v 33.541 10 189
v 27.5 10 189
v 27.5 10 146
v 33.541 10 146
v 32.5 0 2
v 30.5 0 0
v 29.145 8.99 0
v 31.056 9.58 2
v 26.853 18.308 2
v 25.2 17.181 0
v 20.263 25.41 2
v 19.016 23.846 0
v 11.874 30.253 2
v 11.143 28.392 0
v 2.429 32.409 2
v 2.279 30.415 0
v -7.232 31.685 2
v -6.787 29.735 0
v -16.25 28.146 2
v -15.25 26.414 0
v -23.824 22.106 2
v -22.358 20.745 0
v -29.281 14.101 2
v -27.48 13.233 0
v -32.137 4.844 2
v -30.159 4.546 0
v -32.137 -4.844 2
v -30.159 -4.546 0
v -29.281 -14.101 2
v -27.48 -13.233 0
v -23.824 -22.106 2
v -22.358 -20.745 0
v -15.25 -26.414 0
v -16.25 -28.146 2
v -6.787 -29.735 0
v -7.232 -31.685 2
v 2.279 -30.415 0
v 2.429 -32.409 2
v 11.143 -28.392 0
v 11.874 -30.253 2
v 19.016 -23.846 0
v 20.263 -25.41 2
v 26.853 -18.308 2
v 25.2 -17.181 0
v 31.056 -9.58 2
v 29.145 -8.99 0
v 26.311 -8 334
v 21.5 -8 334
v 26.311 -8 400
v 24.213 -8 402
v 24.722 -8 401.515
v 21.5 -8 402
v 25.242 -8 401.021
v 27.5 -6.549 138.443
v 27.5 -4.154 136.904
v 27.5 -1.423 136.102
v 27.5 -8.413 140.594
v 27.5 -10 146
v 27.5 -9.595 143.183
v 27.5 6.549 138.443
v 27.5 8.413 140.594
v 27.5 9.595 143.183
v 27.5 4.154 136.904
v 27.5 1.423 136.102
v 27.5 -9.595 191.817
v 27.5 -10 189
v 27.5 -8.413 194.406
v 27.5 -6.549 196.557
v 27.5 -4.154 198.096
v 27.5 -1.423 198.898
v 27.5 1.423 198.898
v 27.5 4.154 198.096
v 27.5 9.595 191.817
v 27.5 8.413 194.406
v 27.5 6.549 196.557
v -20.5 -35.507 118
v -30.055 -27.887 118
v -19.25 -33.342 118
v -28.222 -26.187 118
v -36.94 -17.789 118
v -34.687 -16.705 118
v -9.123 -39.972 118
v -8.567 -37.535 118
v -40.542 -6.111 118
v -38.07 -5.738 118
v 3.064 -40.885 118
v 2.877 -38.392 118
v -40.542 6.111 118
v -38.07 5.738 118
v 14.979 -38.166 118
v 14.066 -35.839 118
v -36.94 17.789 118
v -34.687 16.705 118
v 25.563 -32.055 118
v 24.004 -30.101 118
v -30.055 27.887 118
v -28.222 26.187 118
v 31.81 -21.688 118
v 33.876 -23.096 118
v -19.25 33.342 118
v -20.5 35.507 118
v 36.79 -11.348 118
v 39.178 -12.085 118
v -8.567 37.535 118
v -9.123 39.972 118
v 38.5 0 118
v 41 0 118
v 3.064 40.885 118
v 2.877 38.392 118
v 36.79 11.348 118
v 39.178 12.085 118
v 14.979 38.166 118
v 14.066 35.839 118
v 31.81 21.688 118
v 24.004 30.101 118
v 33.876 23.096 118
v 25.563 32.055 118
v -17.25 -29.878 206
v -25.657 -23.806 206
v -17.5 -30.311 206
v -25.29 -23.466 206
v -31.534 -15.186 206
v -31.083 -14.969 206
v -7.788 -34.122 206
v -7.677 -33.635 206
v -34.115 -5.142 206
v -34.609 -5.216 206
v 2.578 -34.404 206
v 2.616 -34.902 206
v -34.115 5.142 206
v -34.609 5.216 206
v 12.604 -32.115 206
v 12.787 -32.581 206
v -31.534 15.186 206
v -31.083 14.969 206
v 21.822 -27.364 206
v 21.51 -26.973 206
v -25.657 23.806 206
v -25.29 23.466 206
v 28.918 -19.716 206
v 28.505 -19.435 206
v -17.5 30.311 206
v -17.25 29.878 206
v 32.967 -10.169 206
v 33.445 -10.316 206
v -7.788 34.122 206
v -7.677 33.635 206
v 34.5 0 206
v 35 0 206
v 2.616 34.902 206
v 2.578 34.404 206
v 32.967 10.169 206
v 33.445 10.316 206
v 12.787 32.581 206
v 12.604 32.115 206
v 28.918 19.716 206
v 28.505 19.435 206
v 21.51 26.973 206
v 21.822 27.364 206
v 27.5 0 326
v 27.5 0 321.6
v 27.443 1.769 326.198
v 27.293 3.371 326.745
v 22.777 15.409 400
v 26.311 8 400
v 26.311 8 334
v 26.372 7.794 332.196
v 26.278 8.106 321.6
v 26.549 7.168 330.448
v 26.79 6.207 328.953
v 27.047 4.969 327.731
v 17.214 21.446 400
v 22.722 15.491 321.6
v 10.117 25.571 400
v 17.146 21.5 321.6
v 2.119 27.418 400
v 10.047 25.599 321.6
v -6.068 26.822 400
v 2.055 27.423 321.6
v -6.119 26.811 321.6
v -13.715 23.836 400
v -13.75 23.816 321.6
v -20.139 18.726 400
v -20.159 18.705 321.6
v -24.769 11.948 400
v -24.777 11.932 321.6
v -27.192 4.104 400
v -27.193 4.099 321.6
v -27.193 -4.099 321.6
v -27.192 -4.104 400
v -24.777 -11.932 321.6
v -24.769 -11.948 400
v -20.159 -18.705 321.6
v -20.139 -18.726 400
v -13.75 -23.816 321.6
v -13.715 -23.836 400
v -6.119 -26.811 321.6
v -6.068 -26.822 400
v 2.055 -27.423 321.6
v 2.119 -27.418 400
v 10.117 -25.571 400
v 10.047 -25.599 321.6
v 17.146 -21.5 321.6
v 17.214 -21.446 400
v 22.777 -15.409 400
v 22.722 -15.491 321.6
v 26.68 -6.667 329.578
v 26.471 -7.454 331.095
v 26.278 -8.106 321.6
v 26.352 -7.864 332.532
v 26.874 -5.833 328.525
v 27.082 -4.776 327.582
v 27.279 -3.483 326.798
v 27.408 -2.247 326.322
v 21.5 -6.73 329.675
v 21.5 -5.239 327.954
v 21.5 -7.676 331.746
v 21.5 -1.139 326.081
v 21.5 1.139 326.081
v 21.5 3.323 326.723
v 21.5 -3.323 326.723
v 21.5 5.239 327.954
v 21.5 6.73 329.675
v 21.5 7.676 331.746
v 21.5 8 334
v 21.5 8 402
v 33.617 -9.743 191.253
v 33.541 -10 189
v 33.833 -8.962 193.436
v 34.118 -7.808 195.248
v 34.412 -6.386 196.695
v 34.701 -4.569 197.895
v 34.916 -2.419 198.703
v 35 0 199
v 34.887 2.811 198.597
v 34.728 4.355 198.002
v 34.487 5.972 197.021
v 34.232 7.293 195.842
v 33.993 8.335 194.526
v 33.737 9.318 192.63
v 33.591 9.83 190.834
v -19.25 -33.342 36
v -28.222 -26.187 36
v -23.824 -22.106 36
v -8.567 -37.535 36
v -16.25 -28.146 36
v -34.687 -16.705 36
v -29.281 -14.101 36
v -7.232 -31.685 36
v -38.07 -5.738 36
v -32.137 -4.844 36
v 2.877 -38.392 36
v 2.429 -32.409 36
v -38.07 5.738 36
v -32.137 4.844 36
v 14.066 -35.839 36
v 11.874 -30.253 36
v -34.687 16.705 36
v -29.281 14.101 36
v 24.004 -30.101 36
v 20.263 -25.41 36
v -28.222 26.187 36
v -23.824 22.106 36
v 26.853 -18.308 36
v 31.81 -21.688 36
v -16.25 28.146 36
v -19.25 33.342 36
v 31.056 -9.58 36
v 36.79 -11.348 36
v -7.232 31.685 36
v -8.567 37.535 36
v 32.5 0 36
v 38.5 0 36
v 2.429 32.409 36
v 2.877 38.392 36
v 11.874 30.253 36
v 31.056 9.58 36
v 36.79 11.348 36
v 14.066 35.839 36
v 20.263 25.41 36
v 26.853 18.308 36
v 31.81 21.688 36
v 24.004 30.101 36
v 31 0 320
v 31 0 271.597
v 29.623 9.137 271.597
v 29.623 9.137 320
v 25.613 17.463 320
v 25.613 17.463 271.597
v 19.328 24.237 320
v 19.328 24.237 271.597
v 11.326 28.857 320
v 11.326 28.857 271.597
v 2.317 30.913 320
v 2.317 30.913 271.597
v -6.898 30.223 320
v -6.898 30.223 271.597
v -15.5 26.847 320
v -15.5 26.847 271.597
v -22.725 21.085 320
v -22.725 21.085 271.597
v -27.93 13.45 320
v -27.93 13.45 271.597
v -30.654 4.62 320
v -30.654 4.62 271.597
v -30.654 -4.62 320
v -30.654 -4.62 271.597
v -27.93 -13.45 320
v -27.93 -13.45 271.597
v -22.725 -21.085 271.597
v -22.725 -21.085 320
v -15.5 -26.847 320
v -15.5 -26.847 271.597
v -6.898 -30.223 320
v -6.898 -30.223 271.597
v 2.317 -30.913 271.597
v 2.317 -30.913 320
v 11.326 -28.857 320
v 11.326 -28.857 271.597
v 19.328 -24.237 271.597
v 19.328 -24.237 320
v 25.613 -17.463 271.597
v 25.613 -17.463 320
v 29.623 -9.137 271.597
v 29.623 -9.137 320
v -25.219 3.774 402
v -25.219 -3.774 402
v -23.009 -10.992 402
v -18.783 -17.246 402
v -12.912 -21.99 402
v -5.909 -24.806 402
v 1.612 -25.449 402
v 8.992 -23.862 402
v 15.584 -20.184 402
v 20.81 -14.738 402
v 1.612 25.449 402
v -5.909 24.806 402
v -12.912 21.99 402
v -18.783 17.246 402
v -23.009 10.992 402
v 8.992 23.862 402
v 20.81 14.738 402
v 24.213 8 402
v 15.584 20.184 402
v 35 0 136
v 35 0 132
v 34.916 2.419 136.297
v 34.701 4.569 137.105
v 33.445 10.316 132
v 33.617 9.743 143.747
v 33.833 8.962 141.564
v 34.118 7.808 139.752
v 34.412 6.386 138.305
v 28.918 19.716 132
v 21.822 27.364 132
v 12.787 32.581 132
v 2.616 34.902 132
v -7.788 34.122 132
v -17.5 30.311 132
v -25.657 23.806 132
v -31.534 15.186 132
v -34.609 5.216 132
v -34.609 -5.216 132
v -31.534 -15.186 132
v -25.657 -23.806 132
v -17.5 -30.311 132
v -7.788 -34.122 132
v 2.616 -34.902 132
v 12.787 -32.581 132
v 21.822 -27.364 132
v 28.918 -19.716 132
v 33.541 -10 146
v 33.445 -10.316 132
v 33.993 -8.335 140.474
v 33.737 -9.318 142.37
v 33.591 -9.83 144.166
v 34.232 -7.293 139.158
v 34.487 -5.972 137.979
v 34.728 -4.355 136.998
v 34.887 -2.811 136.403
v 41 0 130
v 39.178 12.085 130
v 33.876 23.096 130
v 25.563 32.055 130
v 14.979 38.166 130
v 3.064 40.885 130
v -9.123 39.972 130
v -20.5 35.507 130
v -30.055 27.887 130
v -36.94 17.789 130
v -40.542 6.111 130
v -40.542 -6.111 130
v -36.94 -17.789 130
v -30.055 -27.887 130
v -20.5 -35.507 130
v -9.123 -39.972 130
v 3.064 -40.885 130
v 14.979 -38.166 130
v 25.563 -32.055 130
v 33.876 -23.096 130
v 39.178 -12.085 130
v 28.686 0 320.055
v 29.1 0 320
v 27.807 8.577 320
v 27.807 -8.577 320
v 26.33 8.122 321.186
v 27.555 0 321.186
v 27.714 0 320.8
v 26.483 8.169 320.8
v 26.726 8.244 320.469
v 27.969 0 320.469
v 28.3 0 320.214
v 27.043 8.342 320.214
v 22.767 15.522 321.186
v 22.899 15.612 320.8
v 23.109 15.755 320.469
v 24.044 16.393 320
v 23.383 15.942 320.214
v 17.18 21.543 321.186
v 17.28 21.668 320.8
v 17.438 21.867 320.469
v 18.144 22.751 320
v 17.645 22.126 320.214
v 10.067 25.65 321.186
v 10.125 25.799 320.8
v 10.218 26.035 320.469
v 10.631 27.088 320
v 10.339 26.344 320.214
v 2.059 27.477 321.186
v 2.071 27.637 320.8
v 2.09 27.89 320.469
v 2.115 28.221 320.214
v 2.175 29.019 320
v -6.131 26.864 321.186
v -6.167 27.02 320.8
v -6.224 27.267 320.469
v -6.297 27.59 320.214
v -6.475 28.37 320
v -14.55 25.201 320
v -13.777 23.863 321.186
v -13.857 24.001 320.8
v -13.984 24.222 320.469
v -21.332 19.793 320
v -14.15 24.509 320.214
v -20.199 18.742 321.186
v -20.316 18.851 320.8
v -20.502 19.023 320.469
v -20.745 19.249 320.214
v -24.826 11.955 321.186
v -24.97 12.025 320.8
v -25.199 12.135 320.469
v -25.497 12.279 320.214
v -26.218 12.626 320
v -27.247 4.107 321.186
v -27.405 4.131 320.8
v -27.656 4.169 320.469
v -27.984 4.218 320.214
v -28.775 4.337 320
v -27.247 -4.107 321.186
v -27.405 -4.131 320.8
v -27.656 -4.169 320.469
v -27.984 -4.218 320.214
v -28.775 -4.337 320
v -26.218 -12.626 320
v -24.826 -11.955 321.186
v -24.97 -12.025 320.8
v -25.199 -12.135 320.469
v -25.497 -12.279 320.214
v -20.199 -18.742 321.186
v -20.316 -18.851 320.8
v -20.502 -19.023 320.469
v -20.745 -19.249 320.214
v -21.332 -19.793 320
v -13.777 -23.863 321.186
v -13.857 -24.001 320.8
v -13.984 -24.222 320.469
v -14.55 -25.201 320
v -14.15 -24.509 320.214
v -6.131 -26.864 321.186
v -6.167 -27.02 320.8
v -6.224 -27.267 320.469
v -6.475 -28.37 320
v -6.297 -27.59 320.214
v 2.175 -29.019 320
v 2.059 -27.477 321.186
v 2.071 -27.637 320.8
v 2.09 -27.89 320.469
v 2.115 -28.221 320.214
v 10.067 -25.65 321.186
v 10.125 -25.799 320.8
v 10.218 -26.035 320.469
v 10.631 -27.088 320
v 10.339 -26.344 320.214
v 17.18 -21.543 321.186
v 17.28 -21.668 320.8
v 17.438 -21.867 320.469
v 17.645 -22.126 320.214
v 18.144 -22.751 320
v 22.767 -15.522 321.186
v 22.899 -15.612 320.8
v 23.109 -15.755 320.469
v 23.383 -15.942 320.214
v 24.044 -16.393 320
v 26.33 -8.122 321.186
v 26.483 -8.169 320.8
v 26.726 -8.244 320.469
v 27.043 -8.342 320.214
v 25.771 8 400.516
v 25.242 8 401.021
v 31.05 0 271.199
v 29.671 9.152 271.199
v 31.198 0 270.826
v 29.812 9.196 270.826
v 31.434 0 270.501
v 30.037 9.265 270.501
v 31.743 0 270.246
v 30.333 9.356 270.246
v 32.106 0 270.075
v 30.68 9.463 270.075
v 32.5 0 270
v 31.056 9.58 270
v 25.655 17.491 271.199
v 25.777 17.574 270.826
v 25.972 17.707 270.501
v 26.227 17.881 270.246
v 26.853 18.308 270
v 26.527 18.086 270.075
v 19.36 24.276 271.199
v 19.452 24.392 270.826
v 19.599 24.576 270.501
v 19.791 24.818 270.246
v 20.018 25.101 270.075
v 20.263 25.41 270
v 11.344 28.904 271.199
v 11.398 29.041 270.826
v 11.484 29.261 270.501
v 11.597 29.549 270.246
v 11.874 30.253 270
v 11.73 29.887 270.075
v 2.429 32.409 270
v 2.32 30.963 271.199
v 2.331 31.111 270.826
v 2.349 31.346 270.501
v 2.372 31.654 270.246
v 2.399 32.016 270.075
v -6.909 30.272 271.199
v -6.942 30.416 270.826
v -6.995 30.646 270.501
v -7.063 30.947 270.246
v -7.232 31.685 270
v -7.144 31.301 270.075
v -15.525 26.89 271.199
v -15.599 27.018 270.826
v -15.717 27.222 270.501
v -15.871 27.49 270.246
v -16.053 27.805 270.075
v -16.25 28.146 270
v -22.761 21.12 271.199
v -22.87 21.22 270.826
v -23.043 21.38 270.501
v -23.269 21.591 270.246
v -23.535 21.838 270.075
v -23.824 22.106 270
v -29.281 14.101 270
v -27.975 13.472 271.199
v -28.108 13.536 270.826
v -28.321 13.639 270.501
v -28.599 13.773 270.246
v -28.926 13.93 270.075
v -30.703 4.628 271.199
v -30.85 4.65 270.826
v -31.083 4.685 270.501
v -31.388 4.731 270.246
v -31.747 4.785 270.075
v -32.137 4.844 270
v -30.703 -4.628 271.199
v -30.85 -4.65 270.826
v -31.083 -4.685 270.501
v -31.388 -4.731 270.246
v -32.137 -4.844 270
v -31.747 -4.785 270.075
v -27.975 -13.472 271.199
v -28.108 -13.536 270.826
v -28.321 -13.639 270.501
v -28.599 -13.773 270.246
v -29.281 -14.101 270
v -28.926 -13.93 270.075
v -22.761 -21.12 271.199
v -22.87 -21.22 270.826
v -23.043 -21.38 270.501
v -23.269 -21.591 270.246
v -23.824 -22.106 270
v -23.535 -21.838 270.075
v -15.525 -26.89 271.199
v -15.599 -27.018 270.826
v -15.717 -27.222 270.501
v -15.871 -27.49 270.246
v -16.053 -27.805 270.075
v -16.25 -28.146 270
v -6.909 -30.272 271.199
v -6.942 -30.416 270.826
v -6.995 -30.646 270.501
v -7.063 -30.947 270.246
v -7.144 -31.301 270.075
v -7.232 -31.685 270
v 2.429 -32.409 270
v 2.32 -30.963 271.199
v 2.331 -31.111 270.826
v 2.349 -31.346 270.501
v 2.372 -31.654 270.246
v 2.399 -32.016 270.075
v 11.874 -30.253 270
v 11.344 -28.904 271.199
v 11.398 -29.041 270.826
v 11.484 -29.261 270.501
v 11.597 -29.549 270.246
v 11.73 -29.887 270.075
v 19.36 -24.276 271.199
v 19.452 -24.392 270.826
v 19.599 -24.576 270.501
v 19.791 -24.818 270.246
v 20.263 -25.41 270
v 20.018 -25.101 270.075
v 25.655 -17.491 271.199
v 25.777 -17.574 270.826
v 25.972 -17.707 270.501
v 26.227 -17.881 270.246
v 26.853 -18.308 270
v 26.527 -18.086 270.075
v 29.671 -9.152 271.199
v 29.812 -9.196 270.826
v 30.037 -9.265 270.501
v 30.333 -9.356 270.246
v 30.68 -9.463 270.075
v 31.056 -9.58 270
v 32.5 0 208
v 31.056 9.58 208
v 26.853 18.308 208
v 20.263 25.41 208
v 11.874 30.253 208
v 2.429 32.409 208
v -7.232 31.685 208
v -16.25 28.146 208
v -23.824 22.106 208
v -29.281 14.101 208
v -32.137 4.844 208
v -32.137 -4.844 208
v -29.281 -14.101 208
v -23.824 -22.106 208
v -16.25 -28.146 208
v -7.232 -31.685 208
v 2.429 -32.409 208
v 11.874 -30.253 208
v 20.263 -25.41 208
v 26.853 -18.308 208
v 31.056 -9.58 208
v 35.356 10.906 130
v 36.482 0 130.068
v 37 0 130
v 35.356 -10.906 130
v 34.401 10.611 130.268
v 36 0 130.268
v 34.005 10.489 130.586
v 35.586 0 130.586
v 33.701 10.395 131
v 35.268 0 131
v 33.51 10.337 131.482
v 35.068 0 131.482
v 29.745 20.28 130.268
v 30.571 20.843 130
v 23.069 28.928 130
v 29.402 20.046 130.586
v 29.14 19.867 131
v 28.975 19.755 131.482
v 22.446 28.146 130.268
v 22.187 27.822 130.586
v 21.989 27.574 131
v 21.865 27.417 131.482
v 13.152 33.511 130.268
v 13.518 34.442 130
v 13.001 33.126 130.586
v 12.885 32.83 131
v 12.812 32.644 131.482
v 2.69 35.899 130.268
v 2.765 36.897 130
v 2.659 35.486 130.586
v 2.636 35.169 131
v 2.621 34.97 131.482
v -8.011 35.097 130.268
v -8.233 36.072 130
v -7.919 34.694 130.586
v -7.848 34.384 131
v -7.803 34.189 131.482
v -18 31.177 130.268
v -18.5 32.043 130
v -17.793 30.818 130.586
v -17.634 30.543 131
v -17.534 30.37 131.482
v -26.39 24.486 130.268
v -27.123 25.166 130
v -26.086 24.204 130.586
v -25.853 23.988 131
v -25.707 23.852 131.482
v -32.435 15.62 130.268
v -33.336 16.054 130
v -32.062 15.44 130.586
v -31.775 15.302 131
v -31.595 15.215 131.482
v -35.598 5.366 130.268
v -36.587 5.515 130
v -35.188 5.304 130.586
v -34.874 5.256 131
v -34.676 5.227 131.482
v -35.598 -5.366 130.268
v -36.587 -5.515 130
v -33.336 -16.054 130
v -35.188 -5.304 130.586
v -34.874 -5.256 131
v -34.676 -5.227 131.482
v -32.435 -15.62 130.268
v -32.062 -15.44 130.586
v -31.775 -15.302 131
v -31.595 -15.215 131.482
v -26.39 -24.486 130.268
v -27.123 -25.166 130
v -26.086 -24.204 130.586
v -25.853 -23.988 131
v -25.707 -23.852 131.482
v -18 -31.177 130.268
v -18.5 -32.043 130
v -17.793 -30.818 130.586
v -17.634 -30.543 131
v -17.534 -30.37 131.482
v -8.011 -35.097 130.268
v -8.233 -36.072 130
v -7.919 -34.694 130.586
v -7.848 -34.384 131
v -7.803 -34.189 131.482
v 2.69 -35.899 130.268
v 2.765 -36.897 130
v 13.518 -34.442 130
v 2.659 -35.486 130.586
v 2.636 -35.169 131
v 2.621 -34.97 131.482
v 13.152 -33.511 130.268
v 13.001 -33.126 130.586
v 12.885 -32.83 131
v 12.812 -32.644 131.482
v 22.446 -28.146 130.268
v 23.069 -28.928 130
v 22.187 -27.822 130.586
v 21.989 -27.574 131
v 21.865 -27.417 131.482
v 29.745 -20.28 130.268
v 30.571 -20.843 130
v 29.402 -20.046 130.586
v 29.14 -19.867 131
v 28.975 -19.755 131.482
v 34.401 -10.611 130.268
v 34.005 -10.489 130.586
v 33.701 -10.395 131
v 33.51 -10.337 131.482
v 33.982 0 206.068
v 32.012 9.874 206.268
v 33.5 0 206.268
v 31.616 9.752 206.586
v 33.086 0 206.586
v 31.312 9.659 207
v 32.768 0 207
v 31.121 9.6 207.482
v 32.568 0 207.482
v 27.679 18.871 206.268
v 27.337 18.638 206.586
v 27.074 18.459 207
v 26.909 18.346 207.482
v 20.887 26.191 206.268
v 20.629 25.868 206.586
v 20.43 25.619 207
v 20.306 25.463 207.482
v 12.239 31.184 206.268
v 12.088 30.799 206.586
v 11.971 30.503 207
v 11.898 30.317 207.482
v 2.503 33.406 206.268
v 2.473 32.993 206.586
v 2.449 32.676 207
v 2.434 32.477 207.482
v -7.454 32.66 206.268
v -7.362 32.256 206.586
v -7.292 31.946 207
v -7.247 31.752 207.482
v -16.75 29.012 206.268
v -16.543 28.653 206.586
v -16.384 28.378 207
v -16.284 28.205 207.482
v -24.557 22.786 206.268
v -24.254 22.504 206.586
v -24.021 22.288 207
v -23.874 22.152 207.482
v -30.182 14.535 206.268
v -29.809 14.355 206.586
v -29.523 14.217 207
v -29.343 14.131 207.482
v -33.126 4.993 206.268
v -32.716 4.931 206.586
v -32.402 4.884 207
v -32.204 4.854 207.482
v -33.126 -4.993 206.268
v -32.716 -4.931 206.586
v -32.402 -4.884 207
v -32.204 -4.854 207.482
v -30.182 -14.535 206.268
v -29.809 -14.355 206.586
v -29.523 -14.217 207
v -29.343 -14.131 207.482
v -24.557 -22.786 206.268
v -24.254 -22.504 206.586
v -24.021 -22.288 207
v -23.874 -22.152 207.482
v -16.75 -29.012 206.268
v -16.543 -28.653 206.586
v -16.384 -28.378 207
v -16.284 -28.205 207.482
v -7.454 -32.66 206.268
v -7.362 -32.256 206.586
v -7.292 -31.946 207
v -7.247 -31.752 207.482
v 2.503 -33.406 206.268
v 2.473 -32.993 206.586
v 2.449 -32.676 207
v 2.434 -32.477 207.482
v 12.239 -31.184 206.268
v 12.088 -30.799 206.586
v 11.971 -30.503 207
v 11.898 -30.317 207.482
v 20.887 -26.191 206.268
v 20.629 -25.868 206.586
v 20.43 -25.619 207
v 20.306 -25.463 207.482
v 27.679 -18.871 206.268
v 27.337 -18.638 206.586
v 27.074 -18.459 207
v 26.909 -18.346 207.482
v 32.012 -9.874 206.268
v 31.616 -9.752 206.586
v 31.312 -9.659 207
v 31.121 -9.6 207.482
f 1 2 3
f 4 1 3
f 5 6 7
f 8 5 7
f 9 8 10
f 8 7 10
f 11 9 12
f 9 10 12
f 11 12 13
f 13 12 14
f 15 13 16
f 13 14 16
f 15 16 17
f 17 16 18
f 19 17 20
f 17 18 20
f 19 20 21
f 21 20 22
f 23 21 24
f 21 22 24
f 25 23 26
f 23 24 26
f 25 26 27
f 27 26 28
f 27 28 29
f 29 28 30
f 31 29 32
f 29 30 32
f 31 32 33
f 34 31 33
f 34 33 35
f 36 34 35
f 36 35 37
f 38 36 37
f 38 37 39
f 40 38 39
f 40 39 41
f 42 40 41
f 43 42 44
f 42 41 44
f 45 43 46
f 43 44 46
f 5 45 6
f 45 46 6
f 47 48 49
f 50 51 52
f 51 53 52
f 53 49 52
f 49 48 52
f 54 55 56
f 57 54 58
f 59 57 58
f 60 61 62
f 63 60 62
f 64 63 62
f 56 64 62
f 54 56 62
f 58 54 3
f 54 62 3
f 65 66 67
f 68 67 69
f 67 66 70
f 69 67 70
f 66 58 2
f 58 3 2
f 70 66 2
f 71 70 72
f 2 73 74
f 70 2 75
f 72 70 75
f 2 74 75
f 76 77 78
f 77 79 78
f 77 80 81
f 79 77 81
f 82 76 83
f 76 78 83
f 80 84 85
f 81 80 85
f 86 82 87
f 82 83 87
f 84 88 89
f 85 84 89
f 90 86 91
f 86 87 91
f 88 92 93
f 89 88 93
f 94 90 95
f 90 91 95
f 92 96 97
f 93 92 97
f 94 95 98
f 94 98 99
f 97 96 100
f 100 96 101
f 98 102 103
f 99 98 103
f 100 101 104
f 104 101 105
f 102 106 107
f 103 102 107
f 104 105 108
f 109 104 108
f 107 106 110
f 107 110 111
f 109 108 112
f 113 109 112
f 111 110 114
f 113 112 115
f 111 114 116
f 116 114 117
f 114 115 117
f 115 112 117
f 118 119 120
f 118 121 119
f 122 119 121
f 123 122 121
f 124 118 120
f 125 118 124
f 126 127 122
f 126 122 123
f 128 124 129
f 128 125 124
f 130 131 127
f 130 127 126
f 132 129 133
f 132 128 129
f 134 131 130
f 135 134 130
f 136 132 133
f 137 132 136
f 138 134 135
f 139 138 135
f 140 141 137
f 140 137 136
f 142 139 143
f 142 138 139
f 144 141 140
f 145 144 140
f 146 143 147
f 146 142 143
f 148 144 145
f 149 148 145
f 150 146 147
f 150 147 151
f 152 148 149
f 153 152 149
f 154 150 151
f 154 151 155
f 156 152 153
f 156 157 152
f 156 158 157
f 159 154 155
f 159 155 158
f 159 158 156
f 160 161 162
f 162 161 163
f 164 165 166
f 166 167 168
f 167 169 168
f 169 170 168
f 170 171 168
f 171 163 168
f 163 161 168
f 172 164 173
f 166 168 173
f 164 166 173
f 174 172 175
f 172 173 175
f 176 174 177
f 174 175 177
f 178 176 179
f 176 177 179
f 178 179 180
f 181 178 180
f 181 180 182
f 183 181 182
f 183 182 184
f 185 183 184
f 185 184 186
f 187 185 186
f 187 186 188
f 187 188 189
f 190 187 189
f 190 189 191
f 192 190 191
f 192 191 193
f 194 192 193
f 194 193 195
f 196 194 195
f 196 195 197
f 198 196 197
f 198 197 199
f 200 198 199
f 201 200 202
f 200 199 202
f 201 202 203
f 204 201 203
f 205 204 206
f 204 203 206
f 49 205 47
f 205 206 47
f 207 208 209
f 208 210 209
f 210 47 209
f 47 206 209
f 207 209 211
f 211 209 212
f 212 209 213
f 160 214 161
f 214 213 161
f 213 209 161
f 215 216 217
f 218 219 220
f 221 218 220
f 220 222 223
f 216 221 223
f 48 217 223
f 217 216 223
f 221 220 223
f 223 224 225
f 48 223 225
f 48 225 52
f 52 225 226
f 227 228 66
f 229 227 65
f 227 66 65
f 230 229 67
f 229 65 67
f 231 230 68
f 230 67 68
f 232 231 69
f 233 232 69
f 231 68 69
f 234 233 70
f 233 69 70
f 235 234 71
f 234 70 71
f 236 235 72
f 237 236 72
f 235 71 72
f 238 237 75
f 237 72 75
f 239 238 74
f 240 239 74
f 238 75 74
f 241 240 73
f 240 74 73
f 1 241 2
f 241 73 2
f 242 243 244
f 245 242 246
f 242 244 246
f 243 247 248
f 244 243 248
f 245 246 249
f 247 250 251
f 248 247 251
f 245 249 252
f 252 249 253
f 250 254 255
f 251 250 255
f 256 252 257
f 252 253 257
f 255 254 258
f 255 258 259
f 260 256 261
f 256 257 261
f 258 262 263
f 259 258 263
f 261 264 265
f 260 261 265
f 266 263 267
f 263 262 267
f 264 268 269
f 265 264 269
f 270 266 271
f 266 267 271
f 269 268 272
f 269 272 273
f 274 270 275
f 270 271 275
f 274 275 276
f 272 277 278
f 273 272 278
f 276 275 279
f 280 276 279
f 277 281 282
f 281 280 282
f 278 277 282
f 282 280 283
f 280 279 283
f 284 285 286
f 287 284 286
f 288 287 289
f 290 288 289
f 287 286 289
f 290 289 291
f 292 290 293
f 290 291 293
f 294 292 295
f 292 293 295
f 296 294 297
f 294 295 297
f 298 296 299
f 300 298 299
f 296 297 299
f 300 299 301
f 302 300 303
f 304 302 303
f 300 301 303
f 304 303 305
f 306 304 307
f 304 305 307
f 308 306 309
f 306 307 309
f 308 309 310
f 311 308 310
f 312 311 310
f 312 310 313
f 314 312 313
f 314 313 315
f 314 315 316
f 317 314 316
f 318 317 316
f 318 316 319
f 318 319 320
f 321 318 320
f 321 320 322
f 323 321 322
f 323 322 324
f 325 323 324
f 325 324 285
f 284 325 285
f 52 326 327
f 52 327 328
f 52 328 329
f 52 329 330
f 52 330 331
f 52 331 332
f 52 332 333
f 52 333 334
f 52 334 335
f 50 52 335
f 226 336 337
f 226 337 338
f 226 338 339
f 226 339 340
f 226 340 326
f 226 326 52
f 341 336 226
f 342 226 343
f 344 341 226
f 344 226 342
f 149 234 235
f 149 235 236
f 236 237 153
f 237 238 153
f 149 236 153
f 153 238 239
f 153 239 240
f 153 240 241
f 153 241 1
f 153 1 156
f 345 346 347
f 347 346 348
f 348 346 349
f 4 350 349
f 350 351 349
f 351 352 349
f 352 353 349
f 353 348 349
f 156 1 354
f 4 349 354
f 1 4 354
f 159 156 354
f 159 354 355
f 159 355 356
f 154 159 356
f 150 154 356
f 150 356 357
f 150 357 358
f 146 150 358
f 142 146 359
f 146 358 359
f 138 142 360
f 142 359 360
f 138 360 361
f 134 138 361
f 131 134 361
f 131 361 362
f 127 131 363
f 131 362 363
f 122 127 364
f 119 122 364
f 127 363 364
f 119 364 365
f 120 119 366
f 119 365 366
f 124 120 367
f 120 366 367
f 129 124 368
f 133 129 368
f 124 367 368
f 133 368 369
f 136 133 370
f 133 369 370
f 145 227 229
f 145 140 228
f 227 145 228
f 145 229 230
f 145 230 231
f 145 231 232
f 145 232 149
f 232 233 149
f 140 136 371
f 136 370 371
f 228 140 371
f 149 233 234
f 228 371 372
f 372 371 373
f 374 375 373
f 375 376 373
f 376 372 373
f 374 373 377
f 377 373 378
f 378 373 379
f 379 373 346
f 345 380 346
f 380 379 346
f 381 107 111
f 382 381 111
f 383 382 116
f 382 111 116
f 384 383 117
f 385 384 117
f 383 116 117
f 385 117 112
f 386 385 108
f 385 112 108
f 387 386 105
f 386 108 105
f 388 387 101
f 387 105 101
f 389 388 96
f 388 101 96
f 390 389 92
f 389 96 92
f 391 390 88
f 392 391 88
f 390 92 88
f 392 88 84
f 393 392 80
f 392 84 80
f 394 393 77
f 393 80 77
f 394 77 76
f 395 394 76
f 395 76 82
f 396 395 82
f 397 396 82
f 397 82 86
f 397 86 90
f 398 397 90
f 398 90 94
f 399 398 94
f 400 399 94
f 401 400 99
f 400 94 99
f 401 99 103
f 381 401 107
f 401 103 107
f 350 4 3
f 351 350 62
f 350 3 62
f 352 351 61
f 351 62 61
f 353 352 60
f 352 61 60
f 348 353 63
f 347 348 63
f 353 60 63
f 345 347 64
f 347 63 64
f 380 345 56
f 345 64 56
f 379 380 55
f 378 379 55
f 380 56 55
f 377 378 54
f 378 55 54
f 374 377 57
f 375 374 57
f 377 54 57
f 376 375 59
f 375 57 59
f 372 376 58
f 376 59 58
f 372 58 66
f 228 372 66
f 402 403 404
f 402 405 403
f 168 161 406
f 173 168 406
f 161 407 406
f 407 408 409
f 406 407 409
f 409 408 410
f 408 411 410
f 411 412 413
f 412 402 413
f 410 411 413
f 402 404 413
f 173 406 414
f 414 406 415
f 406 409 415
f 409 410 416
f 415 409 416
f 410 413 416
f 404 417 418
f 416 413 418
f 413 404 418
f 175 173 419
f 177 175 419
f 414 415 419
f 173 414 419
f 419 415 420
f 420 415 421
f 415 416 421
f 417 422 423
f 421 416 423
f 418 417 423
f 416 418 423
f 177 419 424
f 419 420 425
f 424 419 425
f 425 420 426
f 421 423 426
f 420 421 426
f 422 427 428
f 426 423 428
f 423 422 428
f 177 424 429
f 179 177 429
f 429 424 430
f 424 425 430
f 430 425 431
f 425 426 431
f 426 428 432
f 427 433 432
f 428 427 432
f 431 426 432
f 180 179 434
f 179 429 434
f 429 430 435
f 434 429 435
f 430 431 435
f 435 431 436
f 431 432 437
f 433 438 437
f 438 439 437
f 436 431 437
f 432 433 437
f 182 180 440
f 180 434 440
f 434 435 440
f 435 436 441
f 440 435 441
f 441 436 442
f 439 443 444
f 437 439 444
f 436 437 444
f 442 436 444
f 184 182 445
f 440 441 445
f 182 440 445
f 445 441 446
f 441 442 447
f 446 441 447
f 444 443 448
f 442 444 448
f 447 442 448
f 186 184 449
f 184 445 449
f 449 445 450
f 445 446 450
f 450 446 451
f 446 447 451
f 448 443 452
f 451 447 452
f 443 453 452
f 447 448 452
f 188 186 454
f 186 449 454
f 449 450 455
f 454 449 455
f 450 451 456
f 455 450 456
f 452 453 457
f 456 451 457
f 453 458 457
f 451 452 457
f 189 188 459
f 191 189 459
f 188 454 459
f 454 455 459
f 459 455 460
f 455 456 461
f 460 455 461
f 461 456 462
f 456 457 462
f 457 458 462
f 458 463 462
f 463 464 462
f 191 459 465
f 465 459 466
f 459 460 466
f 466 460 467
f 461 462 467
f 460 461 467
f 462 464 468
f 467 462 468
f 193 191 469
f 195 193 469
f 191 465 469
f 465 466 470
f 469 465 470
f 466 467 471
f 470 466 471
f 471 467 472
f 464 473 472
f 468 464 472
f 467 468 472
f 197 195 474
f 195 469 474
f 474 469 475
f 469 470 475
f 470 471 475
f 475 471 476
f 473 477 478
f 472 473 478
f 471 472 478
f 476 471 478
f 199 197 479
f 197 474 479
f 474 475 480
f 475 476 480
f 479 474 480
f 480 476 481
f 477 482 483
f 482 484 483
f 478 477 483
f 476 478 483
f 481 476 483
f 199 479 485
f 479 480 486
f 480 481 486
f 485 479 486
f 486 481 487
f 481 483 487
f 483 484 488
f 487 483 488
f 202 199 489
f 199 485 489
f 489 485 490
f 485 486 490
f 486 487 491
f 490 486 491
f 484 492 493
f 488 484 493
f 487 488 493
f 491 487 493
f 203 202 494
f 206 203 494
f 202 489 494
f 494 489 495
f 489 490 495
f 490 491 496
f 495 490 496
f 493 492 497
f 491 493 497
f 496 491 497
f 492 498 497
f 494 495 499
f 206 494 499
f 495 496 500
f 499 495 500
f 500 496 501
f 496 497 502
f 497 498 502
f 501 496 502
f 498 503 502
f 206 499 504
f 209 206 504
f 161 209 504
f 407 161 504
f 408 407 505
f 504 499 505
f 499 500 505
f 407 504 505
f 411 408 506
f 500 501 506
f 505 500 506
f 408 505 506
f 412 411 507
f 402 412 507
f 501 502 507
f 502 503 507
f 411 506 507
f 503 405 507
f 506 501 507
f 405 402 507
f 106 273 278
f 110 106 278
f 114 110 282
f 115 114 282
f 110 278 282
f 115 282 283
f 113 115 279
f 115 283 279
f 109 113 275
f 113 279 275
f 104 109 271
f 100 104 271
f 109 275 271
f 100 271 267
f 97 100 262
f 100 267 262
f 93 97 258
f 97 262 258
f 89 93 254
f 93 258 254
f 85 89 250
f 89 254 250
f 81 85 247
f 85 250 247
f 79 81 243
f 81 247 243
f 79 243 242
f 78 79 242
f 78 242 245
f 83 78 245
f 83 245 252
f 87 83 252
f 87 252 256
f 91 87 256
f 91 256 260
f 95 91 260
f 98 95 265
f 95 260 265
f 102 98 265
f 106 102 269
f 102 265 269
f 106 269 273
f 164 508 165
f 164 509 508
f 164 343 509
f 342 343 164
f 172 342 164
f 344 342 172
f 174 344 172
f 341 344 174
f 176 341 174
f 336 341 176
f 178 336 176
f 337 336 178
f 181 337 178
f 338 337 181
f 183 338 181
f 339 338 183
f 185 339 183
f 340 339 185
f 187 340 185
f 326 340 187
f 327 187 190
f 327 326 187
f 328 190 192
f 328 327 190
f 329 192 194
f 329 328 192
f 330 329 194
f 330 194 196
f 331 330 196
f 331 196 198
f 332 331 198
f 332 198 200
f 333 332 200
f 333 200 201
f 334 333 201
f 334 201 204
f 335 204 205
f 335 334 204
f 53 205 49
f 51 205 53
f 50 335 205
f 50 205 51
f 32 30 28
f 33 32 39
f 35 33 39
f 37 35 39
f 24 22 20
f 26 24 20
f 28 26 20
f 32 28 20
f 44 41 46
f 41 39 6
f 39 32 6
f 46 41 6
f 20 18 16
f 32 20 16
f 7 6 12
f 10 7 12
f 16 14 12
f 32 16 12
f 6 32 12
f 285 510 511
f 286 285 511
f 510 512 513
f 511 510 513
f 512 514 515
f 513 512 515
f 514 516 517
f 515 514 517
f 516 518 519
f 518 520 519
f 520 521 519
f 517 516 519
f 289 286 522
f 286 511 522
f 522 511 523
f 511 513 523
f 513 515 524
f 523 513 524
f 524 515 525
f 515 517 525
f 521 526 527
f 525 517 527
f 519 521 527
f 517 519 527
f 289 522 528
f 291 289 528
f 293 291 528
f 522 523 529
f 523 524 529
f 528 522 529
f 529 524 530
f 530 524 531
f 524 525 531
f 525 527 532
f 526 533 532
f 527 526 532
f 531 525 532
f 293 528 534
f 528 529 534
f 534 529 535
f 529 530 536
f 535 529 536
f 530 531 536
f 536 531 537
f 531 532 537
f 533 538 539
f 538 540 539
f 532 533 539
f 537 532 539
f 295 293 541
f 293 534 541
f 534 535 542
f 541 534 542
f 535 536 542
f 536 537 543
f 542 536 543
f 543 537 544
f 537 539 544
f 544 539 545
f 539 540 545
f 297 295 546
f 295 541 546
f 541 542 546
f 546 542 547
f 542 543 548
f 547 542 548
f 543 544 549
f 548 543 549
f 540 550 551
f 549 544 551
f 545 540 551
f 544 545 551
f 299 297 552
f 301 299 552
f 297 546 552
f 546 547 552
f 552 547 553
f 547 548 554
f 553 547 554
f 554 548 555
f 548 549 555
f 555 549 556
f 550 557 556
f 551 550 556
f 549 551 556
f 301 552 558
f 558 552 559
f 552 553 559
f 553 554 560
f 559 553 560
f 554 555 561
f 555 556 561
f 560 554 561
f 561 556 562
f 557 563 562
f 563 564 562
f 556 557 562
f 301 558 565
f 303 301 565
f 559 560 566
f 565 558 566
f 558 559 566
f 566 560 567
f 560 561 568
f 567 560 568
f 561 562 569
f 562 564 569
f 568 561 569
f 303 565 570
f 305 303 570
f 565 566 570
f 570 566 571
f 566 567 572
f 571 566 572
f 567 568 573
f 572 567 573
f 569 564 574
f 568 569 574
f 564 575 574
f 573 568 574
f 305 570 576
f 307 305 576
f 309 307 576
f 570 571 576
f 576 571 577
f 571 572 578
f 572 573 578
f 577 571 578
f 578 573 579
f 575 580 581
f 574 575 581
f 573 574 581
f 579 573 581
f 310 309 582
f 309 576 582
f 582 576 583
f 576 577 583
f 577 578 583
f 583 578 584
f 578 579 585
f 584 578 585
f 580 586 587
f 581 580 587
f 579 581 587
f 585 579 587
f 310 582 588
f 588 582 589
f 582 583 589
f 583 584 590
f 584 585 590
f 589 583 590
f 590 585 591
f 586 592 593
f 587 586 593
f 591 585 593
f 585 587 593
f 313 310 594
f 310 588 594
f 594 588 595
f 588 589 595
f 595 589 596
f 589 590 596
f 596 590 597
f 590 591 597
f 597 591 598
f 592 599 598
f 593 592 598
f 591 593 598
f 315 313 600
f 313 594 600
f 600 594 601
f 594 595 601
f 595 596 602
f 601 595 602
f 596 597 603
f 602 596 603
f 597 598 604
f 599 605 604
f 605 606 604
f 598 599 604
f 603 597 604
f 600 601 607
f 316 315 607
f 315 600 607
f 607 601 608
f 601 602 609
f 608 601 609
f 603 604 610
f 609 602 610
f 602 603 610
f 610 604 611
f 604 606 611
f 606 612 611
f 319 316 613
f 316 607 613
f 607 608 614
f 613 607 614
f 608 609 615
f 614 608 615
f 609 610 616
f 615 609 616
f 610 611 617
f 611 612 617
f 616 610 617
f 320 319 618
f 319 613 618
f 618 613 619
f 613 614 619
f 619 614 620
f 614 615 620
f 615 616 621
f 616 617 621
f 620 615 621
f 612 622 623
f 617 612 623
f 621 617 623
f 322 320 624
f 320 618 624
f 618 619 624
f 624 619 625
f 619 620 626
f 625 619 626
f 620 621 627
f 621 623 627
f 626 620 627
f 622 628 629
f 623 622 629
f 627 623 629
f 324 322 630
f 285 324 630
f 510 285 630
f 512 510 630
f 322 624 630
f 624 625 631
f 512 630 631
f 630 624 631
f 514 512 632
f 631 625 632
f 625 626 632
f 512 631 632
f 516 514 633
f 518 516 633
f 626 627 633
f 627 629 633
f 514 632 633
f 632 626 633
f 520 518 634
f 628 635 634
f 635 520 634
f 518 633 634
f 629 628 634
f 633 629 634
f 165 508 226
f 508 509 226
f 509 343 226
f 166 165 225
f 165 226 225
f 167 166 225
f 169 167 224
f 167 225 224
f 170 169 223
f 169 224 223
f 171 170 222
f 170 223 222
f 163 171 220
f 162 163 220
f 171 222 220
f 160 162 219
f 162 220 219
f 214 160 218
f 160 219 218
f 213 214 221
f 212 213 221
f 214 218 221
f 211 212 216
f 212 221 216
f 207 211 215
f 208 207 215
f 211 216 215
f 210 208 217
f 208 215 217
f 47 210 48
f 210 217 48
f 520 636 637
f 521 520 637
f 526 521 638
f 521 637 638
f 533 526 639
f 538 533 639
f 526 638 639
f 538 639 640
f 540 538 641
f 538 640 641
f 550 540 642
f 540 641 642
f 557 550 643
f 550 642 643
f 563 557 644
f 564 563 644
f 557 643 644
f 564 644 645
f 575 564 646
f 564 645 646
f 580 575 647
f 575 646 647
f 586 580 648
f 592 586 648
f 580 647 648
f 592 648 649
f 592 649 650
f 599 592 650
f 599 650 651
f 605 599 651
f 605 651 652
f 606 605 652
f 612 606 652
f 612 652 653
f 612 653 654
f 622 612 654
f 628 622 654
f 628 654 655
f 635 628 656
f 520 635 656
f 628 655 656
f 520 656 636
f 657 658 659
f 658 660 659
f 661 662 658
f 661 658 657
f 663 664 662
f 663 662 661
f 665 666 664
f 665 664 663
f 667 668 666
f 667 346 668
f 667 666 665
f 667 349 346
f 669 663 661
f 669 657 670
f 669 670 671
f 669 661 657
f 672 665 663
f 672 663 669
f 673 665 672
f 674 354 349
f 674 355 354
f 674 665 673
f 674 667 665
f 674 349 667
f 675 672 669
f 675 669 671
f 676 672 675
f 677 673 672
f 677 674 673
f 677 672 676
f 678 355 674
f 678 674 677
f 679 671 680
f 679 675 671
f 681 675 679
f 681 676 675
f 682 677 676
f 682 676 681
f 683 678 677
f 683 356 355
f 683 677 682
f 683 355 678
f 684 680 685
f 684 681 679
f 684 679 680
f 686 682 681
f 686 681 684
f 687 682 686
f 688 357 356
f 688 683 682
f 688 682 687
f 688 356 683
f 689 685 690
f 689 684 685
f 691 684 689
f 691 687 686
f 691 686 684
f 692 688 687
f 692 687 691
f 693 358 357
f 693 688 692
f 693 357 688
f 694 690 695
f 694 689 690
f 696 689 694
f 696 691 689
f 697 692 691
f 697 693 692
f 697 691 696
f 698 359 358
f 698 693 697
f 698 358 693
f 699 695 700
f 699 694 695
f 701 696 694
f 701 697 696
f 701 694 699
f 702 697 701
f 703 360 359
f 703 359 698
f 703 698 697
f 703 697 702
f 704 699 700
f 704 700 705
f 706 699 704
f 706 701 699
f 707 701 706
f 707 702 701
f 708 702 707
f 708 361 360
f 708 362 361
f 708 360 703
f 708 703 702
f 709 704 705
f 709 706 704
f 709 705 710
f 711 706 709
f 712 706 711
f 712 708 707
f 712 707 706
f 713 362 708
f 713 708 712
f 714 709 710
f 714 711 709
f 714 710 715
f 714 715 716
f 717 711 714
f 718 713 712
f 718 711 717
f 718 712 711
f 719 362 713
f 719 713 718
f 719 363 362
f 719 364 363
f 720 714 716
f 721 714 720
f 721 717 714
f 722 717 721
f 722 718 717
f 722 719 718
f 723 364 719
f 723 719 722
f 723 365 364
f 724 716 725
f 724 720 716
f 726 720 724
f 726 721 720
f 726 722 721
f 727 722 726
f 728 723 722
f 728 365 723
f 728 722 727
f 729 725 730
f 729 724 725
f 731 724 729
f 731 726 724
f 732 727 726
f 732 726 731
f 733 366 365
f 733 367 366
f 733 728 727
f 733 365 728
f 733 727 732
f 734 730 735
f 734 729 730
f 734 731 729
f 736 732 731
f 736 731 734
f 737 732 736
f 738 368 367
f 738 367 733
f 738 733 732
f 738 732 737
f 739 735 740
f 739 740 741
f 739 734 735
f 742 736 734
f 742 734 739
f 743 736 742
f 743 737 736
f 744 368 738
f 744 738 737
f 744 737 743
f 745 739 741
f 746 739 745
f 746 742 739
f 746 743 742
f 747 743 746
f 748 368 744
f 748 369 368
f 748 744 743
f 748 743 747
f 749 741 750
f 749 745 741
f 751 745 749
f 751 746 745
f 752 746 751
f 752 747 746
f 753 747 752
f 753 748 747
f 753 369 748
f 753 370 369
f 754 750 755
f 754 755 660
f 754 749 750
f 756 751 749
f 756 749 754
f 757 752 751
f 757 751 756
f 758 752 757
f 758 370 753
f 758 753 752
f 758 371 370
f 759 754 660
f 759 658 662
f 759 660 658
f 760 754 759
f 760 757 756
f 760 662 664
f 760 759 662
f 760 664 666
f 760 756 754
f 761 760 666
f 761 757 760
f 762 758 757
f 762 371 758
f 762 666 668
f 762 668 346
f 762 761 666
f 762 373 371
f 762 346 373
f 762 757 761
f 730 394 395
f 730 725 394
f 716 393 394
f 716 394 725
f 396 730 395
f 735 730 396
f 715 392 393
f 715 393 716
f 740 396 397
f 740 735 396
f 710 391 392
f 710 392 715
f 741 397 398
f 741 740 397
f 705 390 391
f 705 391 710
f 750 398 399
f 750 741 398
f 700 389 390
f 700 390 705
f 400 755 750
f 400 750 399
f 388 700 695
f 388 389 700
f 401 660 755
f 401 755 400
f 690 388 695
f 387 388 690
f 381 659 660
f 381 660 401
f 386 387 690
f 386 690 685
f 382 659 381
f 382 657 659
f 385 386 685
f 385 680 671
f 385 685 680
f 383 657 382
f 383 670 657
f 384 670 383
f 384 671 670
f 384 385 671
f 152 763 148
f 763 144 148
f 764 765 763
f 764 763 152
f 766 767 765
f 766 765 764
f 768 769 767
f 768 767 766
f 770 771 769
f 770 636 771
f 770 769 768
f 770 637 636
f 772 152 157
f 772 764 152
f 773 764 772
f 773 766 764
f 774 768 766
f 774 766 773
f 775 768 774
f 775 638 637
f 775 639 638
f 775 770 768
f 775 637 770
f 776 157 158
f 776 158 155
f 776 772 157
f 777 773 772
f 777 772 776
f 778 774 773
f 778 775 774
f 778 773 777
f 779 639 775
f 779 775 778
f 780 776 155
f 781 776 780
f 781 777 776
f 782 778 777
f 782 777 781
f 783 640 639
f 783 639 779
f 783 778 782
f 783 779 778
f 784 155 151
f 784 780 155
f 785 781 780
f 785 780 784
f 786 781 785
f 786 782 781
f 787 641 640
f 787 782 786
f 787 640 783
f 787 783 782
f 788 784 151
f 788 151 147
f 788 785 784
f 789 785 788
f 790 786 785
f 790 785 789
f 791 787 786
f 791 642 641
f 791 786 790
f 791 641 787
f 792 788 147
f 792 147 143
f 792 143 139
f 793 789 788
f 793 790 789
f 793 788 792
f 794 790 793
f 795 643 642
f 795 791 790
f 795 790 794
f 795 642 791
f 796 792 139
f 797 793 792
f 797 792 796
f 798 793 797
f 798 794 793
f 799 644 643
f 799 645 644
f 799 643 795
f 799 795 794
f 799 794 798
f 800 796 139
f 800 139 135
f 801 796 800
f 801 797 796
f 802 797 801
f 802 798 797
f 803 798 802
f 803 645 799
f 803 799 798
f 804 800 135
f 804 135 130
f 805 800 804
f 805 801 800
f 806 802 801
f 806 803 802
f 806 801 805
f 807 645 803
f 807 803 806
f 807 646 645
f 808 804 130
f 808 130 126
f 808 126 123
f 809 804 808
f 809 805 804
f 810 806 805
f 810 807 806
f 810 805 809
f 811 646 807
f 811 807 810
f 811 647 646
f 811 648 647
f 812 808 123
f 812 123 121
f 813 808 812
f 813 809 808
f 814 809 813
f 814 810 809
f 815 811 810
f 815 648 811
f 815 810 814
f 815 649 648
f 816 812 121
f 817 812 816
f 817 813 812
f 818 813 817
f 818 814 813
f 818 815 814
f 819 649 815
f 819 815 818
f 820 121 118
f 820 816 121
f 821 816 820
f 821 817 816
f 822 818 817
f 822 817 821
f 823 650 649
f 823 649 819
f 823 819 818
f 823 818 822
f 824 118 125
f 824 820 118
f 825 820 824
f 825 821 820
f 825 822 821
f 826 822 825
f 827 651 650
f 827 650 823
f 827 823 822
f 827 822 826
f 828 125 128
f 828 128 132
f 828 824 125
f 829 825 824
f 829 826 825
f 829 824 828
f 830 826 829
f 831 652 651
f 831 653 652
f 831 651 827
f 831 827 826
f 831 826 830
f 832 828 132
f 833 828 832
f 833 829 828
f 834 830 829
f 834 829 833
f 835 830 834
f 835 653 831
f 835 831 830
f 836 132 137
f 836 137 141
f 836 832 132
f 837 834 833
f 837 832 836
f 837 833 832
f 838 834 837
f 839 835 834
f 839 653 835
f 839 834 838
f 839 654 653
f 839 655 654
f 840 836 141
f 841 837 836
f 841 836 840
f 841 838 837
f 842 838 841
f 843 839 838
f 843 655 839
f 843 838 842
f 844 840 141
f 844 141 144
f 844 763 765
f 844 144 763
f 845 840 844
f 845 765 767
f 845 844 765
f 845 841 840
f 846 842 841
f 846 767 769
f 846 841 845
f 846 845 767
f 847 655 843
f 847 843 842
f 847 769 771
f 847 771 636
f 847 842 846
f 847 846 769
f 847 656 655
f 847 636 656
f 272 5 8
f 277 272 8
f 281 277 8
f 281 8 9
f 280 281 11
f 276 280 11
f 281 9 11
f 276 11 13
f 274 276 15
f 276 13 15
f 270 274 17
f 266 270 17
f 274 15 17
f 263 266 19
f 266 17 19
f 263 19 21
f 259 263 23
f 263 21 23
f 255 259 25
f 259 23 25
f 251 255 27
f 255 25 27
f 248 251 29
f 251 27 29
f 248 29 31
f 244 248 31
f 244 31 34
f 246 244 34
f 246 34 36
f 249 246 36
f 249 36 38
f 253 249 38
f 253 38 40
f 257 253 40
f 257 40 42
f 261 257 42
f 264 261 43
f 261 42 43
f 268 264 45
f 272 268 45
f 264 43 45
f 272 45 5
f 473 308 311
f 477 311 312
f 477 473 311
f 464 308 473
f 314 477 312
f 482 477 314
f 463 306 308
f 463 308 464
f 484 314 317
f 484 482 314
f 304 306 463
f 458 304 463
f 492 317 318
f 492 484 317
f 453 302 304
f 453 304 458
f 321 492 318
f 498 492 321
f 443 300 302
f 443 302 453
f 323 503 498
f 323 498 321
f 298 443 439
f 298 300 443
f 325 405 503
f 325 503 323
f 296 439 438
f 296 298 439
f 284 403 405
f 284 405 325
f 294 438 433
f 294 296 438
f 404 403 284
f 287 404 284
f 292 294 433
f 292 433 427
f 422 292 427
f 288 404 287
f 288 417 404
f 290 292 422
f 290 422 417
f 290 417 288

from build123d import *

# Parameters (mm, degrees)
SKETCH_1_R          = 32.5
EXTRUDE_1_DEPTH     = 36
SKETCH_2_R          = 38.5
EXTRUDE_2_DEPTH     = 82
SKETCH_3_R          = 41
EXTRUDE_3_DEPTH     = 12
SKETCH_4_R          = 35
EXTRUDE_4_DEPTH     = 76
SKETCH_5_R          = 32.5
EXTRUDE_5_DEPTH     = 64
SKETCH_6_R          = 31
EXTRUDE_6_DEPTH     = 50
SKETCH_7_R          = 27.5
EXTRUDE_7_DEPTH     = 82
FILLET_1_R          = 2
FILLET_2_R          = 1.6
CHAMFER_1_SIZE      = 2
CUT_EXTRUDE_1_DEPTH = 29
CUT_EXTRUDE_2_DEPTH = 20


with BuildPart() as part:
    # 草图1 → 凸台-拉伸1 (new body)
    with BuildSketch(Plane.XY):
        Circle(SKETCH_1_R)
    extrude(amount=EXTRUDE_1_DEPTH)

    # 草图2 → 凸台-拉伸2 (add)
    with BuildSketch(Plane.XY.offset(36)):
        Circle(SKETCH_2_R)
    extrude(amount=EXTRUDE_2_DEPTH)

    # 草图3 → 凸台-拉伸3 (add)
    with BuildSketch(Plane.XY.offset(118)):
        Circle(SKETCH_3_R)
    extrude(amount=EXTRUDE_3_DEPTH)

    # 草图4 → 凸台-拉伸4 (add)
    with BuildSketch(Plane.XY.offset(130)):
        Circle(SKETCH_4_R)
    extrude(amount=EXTRUDE_4_DEPTH)

    # 草图5 → 凸台-拉伸5 (add)
    with BuildSketch(Plane.XY.offset(206)):
        Circle(SKETCH_5_R)
    extrude(amount=EXTRUDE_5_DEPTH)

    # 草图6 → 凸台-拉伸6 (add)
    with BuildSketch(Plane.XY.offset(270)):
        Circle(SKETCH_6_R)
    extrude(amount=EXTRUDE_6_DEPTH)

    # 草图7 → 凸台-拉伸7 (add)
    with BuildSketch(Plane.XY.offset(320)):
        Circle(SKETCH_7_R)
    extrude(amount=EXTRUDE_7_DEPTH)

    # 圆角1
    fillet_1_edges = [part.edges().sort_by_distance(p)[0] for p in [
        (-35, 0, 130),
        (-32.5, 0, 206),
    ]]
    fillet(fillet_1_edges, radius=FILLET_1_R)

    # 圆角2
    # the kernel refuses this fillet: 1.6 mm, written as the material it adds along each edge
    with BuildSketch(Plane(origin=(0, 0, 270), x_dir=(1, 0, 0), z_dir=(0, -1, 0))) as fillet_2_piece_1:
        with BuildLine():
            CenterArc((32.6, 1.596871942), FILLET_2_R, 180, 86.416678302)
            Line((31, 1.596871942), (30.968, 1.596871942))
            Line((30.968, 1.596871942), (30.968, 0))
            Line((30.968, 0), (31, -0.032))
            ThreePointArc((31, -0.032), (31.75, -0.032), (32.498, -0.031937439))
            Line((32.498, -0.031937439), (32.5, 0))
        make_face()
    revolve(axis=Axis((0, 0, 270), (0, 0, 1)))
    with BuildSketch(Plane(origin=(0, 0, 320), x_dir=(1, 0, 0), z_dir=(0, -1, 0))) as fillet_2_piece_2:
        with BuildLine():
            CenterArc((27.5 + FILLET_2_R, FILLET_2_R), FILLET_2_R, 180, 90)
            Line((27.5, FILLET_2_R), (27.5 - FILLET_2_R * 0.02, FILLET_2_R))
            Line((27.5 - FILLET_2_R * 0.02, FILLET_2_R), (27.5 - FILLET_2_R * 0.02, -FILLET_2_R * 0.02))
            Line((27.5 - FILLET_2_R * 0.02, -FILLET_2_R * 0.02), (27.5 + FILLET_2_R, -FILLET_2_R * 0.02))
            Line((27.5 + FILLET_2_R, -FILLET_2_R * 0.02), (27.5 + FILLET_2_R, 0))
        make_face()
    revolve(axis=Axis((0, 0, 320), (0, 0, 1)))

    # 倒角1
    chamfer_1_edges = [part.edges().sort_by_distance(p)[0] for p in [
        (-32.5, 0, 0),
        (-27.5, 0, 402),
    ]]
    chamfer(chamfer_1_edges, length=CHAMFER_1_SIZE)

    # 草图8 → 切除-拉伸1 (cut)
    with BuildSketch(Plane(origin=(27.5, 0, 0), x_dir=(0, 0, -1), z_dir=(1, 0, 0))):
        with BuildLine():
            Line((-189, 10), (-146, 10))
            ThreePointArc((-146, 10), (-136, 0), (-146, -10))
            Line((-146, -10), (-189, -10))
            ThreePointArc((-189, -10), (-199, 0), (-189, 10))
        make_face()
    extrude(amount=CUT_EXTRUDE_1_DEPTH, mode=Mode.SUBTRACT)

    # 草图9 → 切除-拉伸2 (cut)
    with BuildSketch(Plane(origin=(21.5, 0, 0), x_dir=(0, 0, -1), z_dir=(1, 0, 0))):
        with BuildLine():
            Line((-402, 8), (-334, 8))
            ThreePointArc((-334, 8), (-326, 0), (-334, -8))
            Line((-334, -8), (-402, -8))
            Line((-402, -8), (-402, 8))
        make_face()
    extrude(amount=CUT_EXTRUDE_2_DEPTH, mode=Mode.SUBTRACT)


solid = part.part
